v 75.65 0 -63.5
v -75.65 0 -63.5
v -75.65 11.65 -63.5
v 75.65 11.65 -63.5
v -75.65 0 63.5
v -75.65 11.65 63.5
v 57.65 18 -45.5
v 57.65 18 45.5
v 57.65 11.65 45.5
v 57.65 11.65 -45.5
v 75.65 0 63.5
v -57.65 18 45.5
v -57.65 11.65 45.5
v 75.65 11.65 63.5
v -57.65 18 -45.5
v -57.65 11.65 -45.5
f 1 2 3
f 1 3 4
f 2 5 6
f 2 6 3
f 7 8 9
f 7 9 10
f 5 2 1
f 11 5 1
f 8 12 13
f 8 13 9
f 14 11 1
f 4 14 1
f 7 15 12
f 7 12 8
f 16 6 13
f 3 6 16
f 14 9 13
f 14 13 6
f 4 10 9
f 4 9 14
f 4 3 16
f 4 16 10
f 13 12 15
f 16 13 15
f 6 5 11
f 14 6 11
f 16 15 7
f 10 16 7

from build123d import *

# Parameters (mm, degrees)
SKETCH1_W           = 151.3
SKETCH1_H           = 127
BOSS_EXTRUDE1_DEPTH = 18
SKETCH3_W           = 18
SKETCH3_H           = 127
CUT_EXTRUDE2_DEPTH  = 6.35
SKETCH2_W           = 151.3
SKETCH2_H           = 18
CUT_EXTRUDE3_DEPTH  = 6.35


with BuildPart() as part:
    # Sketch1 → Boss-Extrude1 (new body)
    with BuildSketch(Plane(origin=(0, 0, 0), x_dir=(1, 0, 0), z_dir=(0, 1, 0))):
        Rectangle(SKETCH1_W, SKETCH1_H)
    extrude(amount=BOSS_EXTRUDE1_DEPTH)

    # Sketch3 → Cut-Extrude2 (cut)
    with BuildSketch(Plane(origin=(0, 18, 0), x_dir=(1, 0, 0), z_dir=(0, 1, 0))):
        with Locations((66.65, 0)):
            Rectangle(SKETCH3_W, SKETCH3_H)
        with Locations((-66.65, 0)):
            Rectangle(SKETCH3_W, SKETCH3_H)
    extrude(amount=-CUT_EXTRUDE2_DEPTH, mode=Mode.SUBTRACT)

    # Sketch2 → Cut-Extrude3 (cut)
    with BuildSketch(Plane(origin=(0, 18, 0), x_dir=(1, 0, 0), z_dir=(0, 1, 0))):
        with Locations((0, -54.5)):
            Rectangle(SKETCH2_W, SKETCH2_H)
        with Locations((0, 54.5)):
            Rectangle(SKETCH2_W, SKETCH2_H)
    extrude(amount=-CUT_EXTRUDE3_DEPTH, mode=Mode.SUBTRACT)


solid = part.part
